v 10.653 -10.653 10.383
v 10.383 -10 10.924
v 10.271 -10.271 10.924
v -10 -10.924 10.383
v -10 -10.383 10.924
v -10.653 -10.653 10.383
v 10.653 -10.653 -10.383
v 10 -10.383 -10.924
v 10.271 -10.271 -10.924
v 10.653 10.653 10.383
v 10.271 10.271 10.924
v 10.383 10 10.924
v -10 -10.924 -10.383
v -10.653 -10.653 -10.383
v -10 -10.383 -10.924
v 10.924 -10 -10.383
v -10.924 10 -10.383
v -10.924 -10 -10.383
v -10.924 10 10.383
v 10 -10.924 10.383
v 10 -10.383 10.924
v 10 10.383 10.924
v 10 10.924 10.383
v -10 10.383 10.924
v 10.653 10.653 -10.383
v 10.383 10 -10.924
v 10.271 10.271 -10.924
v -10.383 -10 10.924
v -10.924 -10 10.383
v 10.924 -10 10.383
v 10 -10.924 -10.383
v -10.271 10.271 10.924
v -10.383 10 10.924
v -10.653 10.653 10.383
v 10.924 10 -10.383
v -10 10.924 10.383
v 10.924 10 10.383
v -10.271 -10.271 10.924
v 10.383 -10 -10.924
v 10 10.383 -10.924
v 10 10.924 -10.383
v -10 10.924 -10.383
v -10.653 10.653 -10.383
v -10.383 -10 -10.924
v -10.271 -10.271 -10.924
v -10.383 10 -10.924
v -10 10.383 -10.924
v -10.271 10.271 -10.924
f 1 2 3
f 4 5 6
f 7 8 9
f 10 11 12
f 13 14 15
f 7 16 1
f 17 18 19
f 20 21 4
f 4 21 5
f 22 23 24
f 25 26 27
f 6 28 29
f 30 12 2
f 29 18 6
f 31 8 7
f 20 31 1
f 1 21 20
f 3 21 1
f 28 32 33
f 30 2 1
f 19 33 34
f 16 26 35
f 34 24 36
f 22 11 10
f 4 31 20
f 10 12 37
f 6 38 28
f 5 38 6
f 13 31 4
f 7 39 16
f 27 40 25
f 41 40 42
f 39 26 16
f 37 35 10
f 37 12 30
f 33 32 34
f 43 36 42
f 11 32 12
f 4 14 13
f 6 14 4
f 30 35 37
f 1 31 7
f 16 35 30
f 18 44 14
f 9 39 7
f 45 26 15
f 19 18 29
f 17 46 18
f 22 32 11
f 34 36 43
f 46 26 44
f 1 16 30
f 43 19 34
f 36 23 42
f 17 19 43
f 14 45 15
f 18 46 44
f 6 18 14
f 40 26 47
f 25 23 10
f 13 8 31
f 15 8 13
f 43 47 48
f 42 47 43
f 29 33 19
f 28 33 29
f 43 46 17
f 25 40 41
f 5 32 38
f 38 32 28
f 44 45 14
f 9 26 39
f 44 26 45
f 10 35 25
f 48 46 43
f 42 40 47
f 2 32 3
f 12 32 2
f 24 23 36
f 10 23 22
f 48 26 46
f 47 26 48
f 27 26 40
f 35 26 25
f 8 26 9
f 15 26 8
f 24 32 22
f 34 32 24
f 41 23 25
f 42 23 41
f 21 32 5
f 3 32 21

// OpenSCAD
// No $fn on the sphere inside a module: a caller can pass $fn/$fa/$fs, so
// the file's globals are not known to apply. Skipped.
$fa = 12; $fs = 0.5;
module rb() {
    minkowski() {
        cube([20, 20, 20], center = true);
        sphere(r = 1);
    }
}
rb($fn = 8);
